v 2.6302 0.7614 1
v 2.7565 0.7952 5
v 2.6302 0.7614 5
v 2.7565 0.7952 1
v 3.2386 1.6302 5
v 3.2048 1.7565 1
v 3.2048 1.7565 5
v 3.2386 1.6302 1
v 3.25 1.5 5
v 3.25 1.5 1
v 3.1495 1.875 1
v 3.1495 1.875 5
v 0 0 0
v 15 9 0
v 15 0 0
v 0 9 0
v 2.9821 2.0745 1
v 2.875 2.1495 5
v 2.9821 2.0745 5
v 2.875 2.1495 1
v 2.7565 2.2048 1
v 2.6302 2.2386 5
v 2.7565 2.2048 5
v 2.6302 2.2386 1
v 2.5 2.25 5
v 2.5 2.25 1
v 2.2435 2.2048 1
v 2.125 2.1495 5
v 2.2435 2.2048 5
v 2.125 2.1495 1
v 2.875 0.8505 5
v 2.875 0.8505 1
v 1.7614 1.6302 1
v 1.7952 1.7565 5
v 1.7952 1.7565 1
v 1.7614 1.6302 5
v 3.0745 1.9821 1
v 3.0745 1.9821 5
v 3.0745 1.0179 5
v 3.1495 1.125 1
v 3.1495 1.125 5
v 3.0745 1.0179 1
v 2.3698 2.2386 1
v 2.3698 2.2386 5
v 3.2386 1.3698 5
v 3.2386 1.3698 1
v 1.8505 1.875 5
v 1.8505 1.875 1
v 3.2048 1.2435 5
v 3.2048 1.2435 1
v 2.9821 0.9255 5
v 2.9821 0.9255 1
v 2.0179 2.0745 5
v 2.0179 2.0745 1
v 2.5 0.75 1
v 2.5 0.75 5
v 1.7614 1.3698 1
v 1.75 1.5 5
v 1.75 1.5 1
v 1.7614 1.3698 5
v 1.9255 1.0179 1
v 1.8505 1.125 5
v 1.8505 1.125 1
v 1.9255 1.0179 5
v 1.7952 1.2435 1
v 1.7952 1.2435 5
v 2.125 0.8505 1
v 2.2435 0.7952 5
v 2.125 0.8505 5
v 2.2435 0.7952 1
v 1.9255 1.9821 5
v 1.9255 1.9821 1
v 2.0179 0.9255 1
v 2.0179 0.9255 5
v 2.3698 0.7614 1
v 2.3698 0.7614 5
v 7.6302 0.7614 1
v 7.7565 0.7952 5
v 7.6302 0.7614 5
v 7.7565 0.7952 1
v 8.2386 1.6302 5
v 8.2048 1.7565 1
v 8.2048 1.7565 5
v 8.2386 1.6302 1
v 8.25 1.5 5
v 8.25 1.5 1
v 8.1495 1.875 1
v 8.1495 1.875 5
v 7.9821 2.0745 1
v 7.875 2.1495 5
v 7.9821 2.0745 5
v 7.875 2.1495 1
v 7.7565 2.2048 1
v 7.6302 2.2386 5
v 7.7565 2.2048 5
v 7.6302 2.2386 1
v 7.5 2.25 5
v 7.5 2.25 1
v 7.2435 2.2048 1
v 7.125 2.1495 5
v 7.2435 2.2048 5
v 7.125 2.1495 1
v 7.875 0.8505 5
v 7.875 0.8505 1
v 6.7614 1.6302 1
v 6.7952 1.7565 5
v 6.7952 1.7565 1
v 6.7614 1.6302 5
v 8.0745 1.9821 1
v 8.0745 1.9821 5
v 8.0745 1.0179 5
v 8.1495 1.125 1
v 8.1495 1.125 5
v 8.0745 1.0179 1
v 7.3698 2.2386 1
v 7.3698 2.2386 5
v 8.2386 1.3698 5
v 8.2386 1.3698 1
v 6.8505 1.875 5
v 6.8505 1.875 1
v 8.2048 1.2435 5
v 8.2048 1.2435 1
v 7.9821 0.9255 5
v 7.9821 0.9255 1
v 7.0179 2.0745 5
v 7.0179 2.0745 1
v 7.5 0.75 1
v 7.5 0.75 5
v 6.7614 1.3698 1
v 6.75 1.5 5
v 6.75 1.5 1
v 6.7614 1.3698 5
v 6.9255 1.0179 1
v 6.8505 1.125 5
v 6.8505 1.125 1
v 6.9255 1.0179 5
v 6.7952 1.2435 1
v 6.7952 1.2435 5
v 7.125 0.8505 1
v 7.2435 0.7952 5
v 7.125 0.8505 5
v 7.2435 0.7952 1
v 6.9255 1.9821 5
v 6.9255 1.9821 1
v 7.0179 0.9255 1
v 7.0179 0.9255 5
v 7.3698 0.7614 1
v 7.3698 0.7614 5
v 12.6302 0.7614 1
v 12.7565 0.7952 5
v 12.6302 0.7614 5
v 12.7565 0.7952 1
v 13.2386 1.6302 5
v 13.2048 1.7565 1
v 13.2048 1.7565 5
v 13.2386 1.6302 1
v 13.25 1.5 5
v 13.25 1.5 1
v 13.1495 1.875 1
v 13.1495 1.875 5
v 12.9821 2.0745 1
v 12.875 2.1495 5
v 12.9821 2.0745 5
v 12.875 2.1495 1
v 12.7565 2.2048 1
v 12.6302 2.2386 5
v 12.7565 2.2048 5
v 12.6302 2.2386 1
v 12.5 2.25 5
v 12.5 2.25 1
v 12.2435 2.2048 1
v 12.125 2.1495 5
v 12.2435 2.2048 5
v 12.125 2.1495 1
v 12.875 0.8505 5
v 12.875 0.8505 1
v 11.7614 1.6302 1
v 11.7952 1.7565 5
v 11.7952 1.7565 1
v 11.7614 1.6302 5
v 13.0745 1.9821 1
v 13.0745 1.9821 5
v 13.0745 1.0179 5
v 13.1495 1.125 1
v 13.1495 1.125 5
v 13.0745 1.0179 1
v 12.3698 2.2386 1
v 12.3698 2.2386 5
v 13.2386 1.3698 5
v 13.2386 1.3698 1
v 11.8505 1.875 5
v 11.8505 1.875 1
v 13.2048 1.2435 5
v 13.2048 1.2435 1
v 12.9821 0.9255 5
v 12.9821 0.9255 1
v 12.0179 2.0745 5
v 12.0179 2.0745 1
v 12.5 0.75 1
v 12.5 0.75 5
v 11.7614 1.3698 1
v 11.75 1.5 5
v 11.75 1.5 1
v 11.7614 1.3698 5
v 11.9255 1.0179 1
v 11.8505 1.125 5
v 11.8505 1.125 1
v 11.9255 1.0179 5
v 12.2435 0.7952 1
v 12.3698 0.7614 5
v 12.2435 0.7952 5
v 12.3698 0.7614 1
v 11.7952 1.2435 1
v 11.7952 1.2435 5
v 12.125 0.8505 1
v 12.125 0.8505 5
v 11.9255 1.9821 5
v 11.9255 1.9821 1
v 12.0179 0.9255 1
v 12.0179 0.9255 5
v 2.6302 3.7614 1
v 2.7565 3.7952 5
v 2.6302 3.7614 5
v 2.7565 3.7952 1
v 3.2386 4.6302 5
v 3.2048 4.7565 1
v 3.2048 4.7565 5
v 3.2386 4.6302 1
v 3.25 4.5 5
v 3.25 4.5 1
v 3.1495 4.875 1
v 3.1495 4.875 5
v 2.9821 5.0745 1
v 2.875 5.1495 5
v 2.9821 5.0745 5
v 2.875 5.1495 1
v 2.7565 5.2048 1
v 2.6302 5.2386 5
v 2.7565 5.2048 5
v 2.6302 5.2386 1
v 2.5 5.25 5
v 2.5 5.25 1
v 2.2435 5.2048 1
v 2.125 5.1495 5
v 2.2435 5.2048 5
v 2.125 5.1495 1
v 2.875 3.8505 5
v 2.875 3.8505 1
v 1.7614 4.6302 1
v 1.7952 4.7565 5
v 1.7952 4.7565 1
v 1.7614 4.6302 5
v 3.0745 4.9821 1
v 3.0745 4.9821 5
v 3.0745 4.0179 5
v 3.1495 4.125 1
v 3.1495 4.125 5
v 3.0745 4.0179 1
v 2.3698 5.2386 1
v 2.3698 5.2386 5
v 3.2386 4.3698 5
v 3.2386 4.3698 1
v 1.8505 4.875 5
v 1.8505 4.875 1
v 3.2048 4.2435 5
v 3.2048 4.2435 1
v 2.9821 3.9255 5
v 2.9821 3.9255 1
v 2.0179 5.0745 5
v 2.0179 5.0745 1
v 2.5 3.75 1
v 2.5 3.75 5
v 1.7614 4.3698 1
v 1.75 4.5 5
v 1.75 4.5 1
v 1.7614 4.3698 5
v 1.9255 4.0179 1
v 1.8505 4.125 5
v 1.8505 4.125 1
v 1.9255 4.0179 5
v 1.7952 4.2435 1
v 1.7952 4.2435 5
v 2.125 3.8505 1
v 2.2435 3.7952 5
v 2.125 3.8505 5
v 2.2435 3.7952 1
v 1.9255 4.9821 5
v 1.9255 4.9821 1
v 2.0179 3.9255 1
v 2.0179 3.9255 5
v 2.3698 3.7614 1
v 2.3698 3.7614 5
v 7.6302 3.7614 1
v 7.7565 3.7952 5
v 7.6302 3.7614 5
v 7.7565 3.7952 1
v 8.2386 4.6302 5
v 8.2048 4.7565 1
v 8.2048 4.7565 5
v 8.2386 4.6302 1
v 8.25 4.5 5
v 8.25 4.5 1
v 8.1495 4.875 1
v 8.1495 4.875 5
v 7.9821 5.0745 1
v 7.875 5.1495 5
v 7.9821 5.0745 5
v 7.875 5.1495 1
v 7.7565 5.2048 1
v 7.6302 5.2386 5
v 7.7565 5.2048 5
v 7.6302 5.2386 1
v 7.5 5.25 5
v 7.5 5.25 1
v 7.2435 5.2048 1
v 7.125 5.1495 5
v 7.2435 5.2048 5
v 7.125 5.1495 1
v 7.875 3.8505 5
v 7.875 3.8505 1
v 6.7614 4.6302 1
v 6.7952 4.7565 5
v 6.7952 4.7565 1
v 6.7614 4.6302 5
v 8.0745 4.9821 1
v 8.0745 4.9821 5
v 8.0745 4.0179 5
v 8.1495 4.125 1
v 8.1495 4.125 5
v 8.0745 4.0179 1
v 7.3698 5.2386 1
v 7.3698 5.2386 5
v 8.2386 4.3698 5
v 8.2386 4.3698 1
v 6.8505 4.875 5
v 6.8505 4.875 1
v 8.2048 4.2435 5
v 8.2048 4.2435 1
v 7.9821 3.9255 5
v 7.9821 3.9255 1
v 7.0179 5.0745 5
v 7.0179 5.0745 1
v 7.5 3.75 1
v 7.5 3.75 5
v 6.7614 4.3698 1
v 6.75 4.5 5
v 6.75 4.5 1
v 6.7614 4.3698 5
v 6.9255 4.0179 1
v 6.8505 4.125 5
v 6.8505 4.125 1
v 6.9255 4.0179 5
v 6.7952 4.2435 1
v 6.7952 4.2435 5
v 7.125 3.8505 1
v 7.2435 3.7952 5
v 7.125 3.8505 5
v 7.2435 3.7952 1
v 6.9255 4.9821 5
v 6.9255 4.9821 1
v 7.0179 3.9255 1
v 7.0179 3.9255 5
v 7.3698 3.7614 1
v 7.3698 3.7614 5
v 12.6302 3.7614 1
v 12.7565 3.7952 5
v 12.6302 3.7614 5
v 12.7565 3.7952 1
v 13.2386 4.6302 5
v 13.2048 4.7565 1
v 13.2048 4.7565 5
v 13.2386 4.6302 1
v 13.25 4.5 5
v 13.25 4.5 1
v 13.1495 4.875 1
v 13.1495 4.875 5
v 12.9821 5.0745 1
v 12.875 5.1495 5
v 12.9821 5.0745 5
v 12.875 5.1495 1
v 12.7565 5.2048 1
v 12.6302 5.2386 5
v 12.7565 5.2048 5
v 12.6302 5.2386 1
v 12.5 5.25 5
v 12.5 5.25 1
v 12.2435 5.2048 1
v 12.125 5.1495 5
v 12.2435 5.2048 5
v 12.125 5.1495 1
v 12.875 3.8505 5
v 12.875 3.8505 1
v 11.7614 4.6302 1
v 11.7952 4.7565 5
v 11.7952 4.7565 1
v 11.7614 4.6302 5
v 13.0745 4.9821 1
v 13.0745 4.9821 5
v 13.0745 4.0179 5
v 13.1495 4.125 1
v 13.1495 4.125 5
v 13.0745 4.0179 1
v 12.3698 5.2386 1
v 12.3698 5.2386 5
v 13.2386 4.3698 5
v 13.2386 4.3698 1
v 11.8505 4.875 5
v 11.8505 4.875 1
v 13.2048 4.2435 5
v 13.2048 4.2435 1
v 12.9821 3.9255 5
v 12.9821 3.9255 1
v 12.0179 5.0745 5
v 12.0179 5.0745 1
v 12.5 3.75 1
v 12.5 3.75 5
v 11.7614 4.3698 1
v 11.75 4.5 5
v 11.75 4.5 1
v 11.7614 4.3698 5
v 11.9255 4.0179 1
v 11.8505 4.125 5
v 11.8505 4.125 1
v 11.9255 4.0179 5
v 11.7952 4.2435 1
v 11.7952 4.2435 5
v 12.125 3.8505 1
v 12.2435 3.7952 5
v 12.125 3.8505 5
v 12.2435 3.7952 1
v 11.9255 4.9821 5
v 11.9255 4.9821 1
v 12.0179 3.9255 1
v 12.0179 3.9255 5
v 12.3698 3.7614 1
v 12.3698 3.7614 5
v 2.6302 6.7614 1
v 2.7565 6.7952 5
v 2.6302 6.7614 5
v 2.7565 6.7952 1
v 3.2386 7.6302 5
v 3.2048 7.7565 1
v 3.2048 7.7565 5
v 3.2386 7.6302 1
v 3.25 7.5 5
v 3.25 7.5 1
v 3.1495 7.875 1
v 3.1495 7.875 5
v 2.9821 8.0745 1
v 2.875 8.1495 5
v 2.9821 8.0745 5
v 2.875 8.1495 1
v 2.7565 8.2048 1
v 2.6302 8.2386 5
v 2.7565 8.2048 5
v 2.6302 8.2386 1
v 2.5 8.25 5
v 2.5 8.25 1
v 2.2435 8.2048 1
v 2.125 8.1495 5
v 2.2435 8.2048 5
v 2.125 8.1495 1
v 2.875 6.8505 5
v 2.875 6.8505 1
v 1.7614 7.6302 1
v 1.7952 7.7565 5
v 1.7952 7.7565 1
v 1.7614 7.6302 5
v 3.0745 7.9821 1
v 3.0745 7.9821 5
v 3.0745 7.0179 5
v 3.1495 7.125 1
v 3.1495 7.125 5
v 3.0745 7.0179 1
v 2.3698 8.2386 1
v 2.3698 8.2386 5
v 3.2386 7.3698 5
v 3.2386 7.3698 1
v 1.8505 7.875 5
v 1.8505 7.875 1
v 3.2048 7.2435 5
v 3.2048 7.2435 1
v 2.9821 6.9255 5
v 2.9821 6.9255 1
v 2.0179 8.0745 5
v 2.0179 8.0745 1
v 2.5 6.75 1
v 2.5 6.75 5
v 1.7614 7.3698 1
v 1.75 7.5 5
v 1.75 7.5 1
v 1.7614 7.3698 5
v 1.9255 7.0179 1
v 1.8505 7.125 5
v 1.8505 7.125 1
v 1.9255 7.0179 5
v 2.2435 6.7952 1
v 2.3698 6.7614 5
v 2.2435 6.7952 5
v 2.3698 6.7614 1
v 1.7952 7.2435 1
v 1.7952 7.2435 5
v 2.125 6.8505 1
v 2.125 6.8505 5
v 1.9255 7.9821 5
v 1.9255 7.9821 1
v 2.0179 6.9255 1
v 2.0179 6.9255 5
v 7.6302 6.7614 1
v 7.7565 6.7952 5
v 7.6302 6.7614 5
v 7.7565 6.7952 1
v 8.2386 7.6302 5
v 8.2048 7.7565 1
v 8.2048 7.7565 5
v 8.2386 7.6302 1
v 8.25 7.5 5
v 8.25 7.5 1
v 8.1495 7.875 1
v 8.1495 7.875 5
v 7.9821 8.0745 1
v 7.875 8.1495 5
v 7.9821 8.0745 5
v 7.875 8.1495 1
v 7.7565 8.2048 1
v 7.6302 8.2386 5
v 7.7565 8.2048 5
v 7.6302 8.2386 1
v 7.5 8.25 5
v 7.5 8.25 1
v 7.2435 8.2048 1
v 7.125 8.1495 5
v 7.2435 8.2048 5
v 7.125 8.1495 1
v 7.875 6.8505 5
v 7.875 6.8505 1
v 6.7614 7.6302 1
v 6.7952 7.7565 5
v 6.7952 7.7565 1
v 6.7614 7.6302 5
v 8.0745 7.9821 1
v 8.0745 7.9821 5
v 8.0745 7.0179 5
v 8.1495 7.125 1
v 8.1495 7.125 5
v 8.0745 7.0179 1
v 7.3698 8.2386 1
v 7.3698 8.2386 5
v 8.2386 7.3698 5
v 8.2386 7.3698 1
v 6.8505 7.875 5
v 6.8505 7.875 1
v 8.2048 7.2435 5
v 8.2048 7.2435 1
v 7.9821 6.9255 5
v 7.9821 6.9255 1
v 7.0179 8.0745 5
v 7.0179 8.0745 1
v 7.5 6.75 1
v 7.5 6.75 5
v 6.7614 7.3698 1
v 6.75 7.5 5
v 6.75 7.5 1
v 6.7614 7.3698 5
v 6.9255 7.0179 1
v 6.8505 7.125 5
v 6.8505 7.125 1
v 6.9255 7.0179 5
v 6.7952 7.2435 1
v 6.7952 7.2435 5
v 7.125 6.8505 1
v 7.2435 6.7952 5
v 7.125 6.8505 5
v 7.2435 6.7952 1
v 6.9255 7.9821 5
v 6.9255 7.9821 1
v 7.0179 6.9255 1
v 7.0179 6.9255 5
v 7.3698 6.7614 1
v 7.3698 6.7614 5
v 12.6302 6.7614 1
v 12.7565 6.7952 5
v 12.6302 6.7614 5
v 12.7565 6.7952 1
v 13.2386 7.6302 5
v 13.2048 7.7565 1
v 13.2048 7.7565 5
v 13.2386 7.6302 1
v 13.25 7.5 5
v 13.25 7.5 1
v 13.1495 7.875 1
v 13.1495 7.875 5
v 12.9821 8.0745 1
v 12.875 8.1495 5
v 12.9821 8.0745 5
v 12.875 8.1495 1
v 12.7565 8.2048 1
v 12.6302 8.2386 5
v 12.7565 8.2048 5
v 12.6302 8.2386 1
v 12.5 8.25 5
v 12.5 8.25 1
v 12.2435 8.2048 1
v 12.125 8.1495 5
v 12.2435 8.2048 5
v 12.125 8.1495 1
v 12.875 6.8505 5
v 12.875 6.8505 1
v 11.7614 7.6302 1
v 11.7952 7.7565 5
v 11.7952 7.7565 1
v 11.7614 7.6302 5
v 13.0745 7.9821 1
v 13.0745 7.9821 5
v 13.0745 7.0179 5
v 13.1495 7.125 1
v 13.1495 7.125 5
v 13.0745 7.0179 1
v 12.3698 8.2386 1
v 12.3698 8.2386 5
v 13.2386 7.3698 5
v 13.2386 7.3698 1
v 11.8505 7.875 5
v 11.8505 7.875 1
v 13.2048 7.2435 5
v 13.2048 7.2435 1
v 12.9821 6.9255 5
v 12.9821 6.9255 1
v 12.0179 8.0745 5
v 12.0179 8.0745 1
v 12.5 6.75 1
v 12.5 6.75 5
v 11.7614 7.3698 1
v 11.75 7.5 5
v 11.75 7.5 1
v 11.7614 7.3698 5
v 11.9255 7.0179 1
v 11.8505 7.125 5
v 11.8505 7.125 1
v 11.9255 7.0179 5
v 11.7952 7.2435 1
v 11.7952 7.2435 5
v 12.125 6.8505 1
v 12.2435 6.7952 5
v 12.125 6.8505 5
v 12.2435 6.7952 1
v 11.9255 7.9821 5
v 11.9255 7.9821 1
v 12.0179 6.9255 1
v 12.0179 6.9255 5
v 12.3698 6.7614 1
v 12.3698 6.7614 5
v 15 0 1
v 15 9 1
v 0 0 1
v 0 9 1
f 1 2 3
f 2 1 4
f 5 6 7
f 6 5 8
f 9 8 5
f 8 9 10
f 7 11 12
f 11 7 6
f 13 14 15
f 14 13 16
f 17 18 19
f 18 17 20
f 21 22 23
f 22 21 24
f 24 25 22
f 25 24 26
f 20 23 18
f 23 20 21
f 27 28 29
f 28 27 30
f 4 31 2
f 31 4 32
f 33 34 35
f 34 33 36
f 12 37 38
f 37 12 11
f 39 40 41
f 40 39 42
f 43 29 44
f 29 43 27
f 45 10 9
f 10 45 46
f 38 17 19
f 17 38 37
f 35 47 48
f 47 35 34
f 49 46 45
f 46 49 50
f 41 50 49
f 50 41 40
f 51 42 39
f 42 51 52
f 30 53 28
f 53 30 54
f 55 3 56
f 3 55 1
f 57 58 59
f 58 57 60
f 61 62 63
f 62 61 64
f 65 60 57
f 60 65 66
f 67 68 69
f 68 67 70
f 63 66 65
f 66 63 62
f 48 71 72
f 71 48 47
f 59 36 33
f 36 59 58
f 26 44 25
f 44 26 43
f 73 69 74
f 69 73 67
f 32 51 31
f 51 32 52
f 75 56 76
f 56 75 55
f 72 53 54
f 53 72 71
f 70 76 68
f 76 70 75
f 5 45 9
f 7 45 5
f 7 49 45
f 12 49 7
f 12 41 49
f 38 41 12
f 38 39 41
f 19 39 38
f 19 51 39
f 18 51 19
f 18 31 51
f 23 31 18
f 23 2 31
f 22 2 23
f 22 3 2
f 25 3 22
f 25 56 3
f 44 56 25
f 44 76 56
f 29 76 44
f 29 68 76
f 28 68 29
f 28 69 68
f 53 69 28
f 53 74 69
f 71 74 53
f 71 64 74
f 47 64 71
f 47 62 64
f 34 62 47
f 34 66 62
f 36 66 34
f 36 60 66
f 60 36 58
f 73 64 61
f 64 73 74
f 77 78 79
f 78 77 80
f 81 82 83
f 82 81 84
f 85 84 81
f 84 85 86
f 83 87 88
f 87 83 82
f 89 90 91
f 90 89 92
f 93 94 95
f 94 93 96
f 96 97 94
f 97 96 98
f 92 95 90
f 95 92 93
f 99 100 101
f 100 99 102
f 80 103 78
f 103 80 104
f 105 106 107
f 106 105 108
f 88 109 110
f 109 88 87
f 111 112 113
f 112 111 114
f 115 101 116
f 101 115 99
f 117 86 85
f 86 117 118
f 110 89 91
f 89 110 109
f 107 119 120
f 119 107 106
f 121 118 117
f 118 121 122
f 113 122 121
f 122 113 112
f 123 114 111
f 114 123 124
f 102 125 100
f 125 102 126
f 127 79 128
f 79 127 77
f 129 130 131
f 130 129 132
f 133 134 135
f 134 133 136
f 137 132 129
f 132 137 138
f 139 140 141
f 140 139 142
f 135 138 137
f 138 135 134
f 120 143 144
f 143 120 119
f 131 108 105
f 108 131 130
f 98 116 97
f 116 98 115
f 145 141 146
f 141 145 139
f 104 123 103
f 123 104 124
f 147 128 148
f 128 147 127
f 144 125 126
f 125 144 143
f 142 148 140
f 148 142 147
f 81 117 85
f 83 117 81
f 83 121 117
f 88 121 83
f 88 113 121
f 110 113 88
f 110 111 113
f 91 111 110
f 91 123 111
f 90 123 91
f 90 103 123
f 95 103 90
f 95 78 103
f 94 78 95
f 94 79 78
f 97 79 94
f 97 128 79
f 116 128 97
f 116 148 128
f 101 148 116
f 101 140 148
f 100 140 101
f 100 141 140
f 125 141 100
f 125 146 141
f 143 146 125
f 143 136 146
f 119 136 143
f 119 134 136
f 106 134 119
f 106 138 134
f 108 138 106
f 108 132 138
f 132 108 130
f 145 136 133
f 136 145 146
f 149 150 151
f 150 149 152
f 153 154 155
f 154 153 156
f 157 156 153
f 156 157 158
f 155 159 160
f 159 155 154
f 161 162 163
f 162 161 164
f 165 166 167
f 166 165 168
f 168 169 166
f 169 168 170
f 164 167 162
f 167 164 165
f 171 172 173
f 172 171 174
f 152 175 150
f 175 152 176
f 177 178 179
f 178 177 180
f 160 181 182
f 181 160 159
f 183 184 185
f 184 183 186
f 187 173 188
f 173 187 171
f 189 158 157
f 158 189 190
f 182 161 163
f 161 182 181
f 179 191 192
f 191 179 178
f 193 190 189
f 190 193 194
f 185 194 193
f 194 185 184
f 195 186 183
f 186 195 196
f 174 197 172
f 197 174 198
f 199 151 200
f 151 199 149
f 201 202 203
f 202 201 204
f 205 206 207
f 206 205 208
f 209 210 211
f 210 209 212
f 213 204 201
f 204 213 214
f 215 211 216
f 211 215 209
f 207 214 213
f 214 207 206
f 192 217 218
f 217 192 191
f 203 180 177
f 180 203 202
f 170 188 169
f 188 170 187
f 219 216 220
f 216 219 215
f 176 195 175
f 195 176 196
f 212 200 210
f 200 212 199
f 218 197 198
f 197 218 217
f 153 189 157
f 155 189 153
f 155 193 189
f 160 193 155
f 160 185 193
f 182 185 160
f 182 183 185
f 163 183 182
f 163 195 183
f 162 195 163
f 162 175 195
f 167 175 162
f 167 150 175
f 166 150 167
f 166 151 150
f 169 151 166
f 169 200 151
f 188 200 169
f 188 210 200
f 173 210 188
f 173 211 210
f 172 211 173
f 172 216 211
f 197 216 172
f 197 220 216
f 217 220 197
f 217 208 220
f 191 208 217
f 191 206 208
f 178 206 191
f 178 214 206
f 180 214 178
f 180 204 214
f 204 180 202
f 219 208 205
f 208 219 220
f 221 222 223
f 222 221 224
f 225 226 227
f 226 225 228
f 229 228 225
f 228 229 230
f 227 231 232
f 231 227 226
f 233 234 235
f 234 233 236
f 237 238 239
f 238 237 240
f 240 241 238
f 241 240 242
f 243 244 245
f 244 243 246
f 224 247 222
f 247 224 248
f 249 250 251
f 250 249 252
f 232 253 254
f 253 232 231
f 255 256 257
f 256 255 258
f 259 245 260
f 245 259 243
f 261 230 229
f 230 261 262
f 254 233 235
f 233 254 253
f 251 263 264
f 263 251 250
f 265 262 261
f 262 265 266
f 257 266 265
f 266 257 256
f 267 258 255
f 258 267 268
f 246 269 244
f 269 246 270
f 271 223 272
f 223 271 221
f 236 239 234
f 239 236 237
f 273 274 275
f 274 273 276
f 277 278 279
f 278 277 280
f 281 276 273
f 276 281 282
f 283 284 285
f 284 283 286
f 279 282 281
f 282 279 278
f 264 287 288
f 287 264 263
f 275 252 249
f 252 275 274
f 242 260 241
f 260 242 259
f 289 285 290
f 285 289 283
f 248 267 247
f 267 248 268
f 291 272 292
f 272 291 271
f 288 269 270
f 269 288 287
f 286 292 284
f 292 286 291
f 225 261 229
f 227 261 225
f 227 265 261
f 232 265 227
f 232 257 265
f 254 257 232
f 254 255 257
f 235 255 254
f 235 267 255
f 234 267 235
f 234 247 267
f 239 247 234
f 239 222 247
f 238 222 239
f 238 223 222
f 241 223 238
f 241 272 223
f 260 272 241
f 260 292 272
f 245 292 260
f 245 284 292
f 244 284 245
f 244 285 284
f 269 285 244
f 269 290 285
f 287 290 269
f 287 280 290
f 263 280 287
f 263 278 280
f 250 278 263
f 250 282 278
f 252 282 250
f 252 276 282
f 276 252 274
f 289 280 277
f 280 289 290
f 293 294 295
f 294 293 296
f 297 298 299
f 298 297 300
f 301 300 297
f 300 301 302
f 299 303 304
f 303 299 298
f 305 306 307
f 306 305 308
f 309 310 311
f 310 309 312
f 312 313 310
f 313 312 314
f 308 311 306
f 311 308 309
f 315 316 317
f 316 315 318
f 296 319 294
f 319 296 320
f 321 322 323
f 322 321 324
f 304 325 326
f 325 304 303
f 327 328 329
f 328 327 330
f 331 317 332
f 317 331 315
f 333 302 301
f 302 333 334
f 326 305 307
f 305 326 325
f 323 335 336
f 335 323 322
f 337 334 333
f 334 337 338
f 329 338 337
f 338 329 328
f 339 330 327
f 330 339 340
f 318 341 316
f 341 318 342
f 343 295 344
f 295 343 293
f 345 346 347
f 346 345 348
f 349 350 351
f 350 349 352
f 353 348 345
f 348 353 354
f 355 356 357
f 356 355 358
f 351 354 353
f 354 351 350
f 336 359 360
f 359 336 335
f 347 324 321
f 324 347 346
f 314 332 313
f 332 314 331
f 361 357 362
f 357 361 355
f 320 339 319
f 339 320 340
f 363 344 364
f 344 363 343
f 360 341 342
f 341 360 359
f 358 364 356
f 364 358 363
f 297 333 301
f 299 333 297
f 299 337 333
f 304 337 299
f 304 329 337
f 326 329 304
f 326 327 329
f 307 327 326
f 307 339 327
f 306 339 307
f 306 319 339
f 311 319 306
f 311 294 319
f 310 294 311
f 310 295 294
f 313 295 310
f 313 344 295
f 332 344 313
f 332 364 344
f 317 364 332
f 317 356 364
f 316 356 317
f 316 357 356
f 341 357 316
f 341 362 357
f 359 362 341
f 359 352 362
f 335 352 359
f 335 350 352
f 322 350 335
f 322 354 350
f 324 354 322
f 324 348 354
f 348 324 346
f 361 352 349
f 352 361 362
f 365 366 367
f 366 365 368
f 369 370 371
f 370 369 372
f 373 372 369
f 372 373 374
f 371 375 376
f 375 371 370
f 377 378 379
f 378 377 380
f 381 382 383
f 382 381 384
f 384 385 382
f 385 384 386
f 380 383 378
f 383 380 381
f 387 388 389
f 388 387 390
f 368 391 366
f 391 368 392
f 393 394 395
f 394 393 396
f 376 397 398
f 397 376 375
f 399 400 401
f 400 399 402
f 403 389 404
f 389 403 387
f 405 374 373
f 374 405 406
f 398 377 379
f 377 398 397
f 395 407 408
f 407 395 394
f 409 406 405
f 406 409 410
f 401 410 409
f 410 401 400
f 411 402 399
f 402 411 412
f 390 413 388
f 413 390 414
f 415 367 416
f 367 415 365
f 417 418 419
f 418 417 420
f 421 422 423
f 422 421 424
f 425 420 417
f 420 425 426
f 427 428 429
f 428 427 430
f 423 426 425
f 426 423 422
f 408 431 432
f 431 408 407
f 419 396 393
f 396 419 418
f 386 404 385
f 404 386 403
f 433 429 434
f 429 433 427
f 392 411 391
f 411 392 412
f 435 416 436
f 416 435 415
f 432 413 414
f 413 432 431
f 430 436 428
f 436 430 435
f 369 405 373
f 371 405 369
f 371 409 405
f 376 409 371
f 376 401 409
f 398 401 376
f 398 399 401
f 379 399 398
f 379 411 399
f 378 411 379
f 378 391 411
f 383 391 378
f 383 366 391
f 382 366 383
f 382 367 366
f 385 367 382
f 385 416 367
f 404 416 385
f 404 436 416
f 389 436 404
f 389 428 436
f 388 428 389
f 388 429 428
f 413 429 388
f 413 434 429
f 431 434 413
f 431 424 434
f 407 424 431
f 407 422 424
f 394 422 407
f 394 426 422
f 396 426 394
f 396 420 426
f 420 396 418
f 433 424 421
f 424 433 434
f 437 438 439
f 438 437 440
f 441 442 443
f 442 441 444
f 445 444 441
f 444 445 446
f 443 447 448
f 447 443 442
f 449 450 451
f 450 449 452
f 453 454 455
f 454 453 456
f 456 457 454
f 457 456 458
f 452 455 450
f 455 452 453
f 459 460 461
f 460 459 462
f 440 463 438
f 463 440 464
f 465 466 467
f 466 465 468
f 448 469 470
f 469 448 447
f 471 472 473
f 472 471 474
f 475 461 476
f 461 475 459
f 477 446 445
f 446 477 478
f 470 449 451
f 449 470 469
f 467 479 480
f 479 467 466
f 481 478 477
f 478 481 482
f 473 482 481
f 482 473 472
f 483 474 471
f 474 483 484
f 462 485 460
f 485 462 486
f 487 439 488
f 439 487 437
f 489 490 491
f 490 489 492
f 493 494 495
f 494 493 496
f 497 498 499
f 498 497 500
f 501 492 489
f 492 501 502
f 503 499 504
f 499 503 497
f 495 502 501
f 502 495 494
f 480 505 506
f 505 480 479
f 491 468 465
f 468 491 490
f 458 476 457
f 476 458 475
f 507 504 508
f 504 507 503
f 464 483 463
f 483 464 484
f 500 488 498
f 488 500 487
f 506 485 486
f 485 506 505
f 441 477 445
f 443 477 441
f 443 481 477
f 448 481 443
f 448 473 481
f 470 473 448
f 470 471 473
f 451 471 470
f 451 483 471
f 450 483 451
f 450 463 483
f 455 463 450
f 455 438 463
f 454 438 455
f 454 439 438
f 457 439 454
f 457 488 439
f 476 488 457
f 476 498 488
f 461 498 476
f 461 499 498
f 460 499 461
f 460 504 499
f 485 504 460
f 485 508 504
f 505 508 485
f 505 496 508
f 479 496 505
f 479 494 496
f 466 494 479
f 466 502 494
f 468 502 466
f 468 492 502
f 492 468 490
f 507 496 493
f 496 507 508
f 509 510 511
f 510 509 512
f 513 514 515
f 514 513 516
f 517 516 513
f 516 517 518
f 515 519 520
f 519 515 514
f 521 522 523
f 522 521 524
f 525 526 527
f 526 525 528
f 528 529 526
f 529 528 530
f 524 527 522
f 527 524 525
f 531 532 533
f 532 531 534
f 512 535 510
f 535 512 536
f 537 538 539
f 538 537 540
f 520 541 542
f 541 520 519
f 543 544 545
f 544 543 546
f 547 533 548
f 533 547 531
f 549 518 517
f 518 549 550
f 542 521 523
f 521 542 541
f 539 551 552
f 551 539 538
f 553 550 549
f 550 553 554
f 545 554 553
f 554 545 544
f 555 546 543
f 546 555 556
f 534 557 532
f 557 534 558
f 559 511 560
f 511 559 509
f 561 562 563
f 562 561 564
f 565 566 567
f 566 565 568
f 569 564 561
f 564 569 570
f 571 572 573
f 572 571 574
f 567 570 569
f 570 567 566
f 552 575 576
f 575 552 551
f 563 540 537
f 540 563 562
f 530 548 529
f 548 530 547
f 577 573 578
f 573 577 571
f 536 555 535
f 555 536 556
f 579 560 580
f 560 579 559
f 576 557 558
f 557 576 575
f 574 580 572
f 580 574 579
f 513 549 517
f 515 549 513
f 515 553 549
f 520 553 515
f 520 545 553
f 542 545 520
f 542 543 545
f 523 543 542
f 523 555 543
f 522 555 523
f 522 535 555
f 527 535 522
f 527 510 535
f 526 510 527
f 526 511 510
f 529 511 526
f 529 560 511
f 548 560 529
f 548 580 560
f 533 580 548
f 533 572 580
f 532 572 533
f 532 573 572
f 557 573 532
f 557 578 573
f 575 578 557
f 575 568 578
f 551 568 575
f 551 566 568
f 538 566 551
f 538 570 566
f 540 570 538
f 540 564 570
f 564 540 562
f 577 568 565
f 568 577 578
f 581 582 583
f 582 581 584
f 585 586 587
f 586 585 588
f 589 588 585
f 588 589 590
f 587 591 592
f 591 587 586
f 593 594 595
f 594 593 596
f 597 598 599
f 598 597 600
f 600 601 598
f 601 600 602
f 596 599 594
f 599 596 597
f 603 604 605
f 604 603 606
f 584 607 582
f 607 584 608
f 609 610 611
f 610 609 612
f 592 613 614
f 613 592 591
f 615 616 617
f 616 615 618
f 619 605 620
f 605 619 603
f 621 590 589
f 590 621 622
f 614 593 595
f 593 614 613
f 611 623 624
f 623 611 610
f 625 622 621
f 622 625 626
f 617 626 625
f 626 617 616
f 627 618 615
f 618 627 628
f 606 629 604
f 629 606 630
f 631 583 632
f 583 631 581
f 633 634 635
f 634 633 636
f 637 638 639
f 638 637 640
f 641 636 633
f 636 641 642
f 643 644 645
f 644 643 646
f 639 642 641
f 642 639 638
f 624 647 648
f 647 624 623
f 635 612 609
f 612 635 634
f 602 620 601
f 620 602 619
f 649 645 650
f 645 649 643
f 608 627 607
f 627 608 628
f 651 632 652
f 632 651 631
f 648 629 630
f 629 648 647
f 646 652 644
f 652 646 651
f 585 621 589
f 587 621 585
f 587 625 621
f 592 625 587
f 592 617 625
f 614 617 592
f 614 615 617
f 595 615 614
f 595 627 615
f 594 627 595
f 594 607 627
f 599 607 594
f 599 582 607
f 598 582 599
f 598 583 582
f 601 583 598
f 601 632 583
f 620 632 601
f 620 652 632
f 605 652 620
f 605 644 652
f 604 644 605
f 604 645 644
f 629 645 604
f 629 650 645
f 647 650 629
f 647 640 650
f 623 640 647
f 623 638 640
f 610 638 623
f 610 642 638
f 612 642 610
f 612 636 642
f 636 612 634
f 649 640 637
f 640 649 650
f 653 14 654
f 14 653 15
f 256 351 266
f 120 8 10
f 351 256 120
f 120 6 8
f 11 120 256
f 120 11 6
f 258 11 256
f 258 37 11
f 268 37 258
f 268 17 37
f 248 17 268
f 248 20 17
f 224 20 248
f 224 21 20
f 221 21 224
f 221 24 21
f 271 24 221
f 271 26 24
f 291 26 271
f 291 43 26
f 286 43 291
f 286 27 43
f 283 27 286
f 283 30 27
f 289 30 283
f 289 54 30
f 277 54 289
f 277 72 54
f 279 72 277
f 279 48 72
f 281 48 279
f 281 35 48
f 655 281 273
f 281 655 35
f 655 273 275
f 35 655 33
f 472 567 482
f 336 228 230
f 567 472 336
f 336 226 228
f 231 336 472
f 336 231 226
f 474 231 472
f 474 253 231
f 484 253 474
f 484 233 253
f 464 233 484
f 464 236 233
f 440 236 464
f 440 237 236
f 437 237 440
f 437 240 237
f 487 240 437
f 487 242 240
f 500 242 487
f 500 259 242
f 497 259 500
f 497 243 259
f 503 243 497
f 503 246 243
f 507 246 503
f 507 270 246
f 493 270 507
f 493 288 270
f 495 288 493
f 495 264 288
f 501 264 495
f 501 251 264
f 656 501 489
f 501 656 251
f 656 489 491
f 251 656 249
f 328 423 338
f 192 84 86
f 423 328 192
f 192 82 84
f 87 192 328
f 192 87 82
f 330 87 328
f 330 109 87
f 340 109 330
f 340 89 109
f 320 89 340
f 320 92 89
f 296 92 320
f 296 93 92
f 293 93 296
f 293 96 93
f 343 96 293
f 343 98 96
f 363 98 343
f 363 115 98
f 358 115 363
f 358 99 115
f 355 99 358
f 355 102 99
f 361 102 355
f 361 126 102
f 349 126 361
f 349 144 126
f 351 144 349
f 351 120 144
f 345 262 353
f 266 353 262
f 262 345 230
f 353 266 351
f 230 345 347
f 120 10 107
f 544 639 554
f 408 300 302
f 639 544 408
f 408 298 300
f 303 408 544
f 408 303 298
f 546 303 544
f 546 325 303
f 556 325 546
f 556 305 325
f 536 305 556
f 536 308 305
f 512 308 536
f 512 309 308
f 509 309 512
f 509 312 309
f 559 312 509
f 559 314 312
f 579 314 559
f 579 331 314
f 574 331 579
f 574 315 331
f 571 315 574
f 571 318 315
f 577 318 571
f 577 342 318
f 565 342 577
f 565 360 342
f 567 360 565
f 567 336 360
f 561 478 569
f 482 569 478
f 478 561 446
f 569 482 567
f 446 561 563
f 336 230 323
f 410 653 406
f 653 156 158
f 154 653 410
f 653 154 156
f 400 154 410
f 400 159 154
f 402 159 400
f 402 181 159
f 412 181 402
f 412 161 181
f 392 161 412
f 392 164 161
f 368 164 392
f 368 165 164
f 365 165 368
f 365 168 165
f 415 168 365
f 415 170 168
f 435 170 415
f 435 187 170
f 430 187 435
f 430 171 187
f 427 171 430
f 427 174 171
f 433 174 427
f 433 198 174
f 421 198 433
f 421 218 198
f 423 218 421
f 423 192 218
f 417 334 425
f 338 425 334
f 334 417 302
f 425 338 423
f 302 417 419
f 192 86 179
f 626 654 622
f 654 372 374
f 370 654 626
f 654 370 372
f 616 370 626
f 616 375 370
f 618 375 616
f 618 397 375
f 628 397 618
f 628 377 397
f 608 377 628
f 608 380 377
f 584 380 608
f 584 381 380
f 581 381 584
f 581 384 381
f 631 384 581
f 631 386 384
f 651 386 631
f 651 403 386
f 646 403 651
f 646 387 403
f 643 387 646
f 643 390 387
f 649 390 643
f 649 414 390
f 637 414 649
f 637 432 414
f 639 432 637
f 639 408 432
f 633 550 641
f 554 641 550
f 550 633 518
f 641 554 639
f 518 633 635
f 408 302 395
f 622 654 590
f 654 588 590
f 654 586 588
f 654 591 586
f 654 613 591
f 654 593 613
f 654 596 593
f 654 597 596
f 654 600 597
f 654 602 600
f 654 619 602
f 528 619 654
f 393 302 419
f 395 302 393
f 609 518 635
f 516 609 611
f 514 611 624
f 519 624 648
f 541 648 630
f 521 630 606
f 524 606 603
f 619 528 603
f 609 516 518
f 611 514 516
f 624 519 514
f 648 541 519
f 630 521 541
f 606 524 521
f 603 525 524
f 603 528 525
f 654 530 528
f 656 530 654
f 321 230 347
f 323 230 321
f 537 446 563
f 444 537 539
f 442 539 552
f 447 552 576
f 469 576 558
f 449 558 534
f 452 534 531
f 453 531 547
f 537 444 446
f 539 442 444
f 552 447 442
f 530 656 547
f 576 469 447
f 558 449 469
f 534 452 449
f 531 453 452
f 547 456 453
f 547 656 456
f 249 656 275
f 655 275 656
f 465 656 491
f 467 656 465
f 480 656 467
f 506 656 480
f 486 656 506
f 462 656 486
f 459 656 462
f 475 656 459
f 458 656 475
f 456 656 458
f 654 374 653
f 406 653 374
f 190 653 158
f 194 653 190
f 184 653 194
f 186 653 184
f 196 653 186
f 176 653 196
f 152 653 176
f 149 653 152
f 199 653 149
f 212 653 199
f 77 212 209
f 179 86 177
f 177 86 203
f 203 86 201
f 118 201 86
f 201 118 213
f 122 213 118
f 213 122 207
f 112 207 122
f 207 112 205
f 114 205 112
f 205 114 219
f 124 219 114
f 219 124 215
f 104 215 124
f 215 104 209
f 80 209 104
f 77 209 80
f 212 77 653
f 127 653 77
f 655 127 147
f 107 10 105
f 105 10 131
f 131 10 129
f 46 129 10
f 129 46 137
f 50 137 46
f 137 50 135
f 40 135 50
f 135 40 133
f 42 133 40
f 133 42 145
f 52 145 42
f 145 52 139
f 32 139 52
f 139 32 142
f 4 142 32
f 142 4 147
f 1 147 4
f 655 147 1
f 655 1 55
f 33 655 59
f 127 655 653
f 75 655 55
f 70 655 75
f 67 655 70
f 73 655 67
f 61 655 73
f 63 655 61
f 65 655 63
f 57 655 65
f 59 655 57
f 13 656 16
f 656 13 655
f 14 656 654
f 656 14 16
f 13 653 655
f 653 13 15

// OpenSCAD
// Number of towers
towers = 3;

//Width of towers
width = 1.5;

//Height of towers
height = 5;

//Base thickness
base = 1;

// Spacing between pegs

//Small Spacing
small = 3;

//Large Spacing
large = 5;


for (x = [0.5:towers])
    for (y = [0.5:towers])
        translate([y*large,x*small,0])
    cylinder(h=height,d=width,$fn=36);
    
cube([large*towers,small*towers,base]);
